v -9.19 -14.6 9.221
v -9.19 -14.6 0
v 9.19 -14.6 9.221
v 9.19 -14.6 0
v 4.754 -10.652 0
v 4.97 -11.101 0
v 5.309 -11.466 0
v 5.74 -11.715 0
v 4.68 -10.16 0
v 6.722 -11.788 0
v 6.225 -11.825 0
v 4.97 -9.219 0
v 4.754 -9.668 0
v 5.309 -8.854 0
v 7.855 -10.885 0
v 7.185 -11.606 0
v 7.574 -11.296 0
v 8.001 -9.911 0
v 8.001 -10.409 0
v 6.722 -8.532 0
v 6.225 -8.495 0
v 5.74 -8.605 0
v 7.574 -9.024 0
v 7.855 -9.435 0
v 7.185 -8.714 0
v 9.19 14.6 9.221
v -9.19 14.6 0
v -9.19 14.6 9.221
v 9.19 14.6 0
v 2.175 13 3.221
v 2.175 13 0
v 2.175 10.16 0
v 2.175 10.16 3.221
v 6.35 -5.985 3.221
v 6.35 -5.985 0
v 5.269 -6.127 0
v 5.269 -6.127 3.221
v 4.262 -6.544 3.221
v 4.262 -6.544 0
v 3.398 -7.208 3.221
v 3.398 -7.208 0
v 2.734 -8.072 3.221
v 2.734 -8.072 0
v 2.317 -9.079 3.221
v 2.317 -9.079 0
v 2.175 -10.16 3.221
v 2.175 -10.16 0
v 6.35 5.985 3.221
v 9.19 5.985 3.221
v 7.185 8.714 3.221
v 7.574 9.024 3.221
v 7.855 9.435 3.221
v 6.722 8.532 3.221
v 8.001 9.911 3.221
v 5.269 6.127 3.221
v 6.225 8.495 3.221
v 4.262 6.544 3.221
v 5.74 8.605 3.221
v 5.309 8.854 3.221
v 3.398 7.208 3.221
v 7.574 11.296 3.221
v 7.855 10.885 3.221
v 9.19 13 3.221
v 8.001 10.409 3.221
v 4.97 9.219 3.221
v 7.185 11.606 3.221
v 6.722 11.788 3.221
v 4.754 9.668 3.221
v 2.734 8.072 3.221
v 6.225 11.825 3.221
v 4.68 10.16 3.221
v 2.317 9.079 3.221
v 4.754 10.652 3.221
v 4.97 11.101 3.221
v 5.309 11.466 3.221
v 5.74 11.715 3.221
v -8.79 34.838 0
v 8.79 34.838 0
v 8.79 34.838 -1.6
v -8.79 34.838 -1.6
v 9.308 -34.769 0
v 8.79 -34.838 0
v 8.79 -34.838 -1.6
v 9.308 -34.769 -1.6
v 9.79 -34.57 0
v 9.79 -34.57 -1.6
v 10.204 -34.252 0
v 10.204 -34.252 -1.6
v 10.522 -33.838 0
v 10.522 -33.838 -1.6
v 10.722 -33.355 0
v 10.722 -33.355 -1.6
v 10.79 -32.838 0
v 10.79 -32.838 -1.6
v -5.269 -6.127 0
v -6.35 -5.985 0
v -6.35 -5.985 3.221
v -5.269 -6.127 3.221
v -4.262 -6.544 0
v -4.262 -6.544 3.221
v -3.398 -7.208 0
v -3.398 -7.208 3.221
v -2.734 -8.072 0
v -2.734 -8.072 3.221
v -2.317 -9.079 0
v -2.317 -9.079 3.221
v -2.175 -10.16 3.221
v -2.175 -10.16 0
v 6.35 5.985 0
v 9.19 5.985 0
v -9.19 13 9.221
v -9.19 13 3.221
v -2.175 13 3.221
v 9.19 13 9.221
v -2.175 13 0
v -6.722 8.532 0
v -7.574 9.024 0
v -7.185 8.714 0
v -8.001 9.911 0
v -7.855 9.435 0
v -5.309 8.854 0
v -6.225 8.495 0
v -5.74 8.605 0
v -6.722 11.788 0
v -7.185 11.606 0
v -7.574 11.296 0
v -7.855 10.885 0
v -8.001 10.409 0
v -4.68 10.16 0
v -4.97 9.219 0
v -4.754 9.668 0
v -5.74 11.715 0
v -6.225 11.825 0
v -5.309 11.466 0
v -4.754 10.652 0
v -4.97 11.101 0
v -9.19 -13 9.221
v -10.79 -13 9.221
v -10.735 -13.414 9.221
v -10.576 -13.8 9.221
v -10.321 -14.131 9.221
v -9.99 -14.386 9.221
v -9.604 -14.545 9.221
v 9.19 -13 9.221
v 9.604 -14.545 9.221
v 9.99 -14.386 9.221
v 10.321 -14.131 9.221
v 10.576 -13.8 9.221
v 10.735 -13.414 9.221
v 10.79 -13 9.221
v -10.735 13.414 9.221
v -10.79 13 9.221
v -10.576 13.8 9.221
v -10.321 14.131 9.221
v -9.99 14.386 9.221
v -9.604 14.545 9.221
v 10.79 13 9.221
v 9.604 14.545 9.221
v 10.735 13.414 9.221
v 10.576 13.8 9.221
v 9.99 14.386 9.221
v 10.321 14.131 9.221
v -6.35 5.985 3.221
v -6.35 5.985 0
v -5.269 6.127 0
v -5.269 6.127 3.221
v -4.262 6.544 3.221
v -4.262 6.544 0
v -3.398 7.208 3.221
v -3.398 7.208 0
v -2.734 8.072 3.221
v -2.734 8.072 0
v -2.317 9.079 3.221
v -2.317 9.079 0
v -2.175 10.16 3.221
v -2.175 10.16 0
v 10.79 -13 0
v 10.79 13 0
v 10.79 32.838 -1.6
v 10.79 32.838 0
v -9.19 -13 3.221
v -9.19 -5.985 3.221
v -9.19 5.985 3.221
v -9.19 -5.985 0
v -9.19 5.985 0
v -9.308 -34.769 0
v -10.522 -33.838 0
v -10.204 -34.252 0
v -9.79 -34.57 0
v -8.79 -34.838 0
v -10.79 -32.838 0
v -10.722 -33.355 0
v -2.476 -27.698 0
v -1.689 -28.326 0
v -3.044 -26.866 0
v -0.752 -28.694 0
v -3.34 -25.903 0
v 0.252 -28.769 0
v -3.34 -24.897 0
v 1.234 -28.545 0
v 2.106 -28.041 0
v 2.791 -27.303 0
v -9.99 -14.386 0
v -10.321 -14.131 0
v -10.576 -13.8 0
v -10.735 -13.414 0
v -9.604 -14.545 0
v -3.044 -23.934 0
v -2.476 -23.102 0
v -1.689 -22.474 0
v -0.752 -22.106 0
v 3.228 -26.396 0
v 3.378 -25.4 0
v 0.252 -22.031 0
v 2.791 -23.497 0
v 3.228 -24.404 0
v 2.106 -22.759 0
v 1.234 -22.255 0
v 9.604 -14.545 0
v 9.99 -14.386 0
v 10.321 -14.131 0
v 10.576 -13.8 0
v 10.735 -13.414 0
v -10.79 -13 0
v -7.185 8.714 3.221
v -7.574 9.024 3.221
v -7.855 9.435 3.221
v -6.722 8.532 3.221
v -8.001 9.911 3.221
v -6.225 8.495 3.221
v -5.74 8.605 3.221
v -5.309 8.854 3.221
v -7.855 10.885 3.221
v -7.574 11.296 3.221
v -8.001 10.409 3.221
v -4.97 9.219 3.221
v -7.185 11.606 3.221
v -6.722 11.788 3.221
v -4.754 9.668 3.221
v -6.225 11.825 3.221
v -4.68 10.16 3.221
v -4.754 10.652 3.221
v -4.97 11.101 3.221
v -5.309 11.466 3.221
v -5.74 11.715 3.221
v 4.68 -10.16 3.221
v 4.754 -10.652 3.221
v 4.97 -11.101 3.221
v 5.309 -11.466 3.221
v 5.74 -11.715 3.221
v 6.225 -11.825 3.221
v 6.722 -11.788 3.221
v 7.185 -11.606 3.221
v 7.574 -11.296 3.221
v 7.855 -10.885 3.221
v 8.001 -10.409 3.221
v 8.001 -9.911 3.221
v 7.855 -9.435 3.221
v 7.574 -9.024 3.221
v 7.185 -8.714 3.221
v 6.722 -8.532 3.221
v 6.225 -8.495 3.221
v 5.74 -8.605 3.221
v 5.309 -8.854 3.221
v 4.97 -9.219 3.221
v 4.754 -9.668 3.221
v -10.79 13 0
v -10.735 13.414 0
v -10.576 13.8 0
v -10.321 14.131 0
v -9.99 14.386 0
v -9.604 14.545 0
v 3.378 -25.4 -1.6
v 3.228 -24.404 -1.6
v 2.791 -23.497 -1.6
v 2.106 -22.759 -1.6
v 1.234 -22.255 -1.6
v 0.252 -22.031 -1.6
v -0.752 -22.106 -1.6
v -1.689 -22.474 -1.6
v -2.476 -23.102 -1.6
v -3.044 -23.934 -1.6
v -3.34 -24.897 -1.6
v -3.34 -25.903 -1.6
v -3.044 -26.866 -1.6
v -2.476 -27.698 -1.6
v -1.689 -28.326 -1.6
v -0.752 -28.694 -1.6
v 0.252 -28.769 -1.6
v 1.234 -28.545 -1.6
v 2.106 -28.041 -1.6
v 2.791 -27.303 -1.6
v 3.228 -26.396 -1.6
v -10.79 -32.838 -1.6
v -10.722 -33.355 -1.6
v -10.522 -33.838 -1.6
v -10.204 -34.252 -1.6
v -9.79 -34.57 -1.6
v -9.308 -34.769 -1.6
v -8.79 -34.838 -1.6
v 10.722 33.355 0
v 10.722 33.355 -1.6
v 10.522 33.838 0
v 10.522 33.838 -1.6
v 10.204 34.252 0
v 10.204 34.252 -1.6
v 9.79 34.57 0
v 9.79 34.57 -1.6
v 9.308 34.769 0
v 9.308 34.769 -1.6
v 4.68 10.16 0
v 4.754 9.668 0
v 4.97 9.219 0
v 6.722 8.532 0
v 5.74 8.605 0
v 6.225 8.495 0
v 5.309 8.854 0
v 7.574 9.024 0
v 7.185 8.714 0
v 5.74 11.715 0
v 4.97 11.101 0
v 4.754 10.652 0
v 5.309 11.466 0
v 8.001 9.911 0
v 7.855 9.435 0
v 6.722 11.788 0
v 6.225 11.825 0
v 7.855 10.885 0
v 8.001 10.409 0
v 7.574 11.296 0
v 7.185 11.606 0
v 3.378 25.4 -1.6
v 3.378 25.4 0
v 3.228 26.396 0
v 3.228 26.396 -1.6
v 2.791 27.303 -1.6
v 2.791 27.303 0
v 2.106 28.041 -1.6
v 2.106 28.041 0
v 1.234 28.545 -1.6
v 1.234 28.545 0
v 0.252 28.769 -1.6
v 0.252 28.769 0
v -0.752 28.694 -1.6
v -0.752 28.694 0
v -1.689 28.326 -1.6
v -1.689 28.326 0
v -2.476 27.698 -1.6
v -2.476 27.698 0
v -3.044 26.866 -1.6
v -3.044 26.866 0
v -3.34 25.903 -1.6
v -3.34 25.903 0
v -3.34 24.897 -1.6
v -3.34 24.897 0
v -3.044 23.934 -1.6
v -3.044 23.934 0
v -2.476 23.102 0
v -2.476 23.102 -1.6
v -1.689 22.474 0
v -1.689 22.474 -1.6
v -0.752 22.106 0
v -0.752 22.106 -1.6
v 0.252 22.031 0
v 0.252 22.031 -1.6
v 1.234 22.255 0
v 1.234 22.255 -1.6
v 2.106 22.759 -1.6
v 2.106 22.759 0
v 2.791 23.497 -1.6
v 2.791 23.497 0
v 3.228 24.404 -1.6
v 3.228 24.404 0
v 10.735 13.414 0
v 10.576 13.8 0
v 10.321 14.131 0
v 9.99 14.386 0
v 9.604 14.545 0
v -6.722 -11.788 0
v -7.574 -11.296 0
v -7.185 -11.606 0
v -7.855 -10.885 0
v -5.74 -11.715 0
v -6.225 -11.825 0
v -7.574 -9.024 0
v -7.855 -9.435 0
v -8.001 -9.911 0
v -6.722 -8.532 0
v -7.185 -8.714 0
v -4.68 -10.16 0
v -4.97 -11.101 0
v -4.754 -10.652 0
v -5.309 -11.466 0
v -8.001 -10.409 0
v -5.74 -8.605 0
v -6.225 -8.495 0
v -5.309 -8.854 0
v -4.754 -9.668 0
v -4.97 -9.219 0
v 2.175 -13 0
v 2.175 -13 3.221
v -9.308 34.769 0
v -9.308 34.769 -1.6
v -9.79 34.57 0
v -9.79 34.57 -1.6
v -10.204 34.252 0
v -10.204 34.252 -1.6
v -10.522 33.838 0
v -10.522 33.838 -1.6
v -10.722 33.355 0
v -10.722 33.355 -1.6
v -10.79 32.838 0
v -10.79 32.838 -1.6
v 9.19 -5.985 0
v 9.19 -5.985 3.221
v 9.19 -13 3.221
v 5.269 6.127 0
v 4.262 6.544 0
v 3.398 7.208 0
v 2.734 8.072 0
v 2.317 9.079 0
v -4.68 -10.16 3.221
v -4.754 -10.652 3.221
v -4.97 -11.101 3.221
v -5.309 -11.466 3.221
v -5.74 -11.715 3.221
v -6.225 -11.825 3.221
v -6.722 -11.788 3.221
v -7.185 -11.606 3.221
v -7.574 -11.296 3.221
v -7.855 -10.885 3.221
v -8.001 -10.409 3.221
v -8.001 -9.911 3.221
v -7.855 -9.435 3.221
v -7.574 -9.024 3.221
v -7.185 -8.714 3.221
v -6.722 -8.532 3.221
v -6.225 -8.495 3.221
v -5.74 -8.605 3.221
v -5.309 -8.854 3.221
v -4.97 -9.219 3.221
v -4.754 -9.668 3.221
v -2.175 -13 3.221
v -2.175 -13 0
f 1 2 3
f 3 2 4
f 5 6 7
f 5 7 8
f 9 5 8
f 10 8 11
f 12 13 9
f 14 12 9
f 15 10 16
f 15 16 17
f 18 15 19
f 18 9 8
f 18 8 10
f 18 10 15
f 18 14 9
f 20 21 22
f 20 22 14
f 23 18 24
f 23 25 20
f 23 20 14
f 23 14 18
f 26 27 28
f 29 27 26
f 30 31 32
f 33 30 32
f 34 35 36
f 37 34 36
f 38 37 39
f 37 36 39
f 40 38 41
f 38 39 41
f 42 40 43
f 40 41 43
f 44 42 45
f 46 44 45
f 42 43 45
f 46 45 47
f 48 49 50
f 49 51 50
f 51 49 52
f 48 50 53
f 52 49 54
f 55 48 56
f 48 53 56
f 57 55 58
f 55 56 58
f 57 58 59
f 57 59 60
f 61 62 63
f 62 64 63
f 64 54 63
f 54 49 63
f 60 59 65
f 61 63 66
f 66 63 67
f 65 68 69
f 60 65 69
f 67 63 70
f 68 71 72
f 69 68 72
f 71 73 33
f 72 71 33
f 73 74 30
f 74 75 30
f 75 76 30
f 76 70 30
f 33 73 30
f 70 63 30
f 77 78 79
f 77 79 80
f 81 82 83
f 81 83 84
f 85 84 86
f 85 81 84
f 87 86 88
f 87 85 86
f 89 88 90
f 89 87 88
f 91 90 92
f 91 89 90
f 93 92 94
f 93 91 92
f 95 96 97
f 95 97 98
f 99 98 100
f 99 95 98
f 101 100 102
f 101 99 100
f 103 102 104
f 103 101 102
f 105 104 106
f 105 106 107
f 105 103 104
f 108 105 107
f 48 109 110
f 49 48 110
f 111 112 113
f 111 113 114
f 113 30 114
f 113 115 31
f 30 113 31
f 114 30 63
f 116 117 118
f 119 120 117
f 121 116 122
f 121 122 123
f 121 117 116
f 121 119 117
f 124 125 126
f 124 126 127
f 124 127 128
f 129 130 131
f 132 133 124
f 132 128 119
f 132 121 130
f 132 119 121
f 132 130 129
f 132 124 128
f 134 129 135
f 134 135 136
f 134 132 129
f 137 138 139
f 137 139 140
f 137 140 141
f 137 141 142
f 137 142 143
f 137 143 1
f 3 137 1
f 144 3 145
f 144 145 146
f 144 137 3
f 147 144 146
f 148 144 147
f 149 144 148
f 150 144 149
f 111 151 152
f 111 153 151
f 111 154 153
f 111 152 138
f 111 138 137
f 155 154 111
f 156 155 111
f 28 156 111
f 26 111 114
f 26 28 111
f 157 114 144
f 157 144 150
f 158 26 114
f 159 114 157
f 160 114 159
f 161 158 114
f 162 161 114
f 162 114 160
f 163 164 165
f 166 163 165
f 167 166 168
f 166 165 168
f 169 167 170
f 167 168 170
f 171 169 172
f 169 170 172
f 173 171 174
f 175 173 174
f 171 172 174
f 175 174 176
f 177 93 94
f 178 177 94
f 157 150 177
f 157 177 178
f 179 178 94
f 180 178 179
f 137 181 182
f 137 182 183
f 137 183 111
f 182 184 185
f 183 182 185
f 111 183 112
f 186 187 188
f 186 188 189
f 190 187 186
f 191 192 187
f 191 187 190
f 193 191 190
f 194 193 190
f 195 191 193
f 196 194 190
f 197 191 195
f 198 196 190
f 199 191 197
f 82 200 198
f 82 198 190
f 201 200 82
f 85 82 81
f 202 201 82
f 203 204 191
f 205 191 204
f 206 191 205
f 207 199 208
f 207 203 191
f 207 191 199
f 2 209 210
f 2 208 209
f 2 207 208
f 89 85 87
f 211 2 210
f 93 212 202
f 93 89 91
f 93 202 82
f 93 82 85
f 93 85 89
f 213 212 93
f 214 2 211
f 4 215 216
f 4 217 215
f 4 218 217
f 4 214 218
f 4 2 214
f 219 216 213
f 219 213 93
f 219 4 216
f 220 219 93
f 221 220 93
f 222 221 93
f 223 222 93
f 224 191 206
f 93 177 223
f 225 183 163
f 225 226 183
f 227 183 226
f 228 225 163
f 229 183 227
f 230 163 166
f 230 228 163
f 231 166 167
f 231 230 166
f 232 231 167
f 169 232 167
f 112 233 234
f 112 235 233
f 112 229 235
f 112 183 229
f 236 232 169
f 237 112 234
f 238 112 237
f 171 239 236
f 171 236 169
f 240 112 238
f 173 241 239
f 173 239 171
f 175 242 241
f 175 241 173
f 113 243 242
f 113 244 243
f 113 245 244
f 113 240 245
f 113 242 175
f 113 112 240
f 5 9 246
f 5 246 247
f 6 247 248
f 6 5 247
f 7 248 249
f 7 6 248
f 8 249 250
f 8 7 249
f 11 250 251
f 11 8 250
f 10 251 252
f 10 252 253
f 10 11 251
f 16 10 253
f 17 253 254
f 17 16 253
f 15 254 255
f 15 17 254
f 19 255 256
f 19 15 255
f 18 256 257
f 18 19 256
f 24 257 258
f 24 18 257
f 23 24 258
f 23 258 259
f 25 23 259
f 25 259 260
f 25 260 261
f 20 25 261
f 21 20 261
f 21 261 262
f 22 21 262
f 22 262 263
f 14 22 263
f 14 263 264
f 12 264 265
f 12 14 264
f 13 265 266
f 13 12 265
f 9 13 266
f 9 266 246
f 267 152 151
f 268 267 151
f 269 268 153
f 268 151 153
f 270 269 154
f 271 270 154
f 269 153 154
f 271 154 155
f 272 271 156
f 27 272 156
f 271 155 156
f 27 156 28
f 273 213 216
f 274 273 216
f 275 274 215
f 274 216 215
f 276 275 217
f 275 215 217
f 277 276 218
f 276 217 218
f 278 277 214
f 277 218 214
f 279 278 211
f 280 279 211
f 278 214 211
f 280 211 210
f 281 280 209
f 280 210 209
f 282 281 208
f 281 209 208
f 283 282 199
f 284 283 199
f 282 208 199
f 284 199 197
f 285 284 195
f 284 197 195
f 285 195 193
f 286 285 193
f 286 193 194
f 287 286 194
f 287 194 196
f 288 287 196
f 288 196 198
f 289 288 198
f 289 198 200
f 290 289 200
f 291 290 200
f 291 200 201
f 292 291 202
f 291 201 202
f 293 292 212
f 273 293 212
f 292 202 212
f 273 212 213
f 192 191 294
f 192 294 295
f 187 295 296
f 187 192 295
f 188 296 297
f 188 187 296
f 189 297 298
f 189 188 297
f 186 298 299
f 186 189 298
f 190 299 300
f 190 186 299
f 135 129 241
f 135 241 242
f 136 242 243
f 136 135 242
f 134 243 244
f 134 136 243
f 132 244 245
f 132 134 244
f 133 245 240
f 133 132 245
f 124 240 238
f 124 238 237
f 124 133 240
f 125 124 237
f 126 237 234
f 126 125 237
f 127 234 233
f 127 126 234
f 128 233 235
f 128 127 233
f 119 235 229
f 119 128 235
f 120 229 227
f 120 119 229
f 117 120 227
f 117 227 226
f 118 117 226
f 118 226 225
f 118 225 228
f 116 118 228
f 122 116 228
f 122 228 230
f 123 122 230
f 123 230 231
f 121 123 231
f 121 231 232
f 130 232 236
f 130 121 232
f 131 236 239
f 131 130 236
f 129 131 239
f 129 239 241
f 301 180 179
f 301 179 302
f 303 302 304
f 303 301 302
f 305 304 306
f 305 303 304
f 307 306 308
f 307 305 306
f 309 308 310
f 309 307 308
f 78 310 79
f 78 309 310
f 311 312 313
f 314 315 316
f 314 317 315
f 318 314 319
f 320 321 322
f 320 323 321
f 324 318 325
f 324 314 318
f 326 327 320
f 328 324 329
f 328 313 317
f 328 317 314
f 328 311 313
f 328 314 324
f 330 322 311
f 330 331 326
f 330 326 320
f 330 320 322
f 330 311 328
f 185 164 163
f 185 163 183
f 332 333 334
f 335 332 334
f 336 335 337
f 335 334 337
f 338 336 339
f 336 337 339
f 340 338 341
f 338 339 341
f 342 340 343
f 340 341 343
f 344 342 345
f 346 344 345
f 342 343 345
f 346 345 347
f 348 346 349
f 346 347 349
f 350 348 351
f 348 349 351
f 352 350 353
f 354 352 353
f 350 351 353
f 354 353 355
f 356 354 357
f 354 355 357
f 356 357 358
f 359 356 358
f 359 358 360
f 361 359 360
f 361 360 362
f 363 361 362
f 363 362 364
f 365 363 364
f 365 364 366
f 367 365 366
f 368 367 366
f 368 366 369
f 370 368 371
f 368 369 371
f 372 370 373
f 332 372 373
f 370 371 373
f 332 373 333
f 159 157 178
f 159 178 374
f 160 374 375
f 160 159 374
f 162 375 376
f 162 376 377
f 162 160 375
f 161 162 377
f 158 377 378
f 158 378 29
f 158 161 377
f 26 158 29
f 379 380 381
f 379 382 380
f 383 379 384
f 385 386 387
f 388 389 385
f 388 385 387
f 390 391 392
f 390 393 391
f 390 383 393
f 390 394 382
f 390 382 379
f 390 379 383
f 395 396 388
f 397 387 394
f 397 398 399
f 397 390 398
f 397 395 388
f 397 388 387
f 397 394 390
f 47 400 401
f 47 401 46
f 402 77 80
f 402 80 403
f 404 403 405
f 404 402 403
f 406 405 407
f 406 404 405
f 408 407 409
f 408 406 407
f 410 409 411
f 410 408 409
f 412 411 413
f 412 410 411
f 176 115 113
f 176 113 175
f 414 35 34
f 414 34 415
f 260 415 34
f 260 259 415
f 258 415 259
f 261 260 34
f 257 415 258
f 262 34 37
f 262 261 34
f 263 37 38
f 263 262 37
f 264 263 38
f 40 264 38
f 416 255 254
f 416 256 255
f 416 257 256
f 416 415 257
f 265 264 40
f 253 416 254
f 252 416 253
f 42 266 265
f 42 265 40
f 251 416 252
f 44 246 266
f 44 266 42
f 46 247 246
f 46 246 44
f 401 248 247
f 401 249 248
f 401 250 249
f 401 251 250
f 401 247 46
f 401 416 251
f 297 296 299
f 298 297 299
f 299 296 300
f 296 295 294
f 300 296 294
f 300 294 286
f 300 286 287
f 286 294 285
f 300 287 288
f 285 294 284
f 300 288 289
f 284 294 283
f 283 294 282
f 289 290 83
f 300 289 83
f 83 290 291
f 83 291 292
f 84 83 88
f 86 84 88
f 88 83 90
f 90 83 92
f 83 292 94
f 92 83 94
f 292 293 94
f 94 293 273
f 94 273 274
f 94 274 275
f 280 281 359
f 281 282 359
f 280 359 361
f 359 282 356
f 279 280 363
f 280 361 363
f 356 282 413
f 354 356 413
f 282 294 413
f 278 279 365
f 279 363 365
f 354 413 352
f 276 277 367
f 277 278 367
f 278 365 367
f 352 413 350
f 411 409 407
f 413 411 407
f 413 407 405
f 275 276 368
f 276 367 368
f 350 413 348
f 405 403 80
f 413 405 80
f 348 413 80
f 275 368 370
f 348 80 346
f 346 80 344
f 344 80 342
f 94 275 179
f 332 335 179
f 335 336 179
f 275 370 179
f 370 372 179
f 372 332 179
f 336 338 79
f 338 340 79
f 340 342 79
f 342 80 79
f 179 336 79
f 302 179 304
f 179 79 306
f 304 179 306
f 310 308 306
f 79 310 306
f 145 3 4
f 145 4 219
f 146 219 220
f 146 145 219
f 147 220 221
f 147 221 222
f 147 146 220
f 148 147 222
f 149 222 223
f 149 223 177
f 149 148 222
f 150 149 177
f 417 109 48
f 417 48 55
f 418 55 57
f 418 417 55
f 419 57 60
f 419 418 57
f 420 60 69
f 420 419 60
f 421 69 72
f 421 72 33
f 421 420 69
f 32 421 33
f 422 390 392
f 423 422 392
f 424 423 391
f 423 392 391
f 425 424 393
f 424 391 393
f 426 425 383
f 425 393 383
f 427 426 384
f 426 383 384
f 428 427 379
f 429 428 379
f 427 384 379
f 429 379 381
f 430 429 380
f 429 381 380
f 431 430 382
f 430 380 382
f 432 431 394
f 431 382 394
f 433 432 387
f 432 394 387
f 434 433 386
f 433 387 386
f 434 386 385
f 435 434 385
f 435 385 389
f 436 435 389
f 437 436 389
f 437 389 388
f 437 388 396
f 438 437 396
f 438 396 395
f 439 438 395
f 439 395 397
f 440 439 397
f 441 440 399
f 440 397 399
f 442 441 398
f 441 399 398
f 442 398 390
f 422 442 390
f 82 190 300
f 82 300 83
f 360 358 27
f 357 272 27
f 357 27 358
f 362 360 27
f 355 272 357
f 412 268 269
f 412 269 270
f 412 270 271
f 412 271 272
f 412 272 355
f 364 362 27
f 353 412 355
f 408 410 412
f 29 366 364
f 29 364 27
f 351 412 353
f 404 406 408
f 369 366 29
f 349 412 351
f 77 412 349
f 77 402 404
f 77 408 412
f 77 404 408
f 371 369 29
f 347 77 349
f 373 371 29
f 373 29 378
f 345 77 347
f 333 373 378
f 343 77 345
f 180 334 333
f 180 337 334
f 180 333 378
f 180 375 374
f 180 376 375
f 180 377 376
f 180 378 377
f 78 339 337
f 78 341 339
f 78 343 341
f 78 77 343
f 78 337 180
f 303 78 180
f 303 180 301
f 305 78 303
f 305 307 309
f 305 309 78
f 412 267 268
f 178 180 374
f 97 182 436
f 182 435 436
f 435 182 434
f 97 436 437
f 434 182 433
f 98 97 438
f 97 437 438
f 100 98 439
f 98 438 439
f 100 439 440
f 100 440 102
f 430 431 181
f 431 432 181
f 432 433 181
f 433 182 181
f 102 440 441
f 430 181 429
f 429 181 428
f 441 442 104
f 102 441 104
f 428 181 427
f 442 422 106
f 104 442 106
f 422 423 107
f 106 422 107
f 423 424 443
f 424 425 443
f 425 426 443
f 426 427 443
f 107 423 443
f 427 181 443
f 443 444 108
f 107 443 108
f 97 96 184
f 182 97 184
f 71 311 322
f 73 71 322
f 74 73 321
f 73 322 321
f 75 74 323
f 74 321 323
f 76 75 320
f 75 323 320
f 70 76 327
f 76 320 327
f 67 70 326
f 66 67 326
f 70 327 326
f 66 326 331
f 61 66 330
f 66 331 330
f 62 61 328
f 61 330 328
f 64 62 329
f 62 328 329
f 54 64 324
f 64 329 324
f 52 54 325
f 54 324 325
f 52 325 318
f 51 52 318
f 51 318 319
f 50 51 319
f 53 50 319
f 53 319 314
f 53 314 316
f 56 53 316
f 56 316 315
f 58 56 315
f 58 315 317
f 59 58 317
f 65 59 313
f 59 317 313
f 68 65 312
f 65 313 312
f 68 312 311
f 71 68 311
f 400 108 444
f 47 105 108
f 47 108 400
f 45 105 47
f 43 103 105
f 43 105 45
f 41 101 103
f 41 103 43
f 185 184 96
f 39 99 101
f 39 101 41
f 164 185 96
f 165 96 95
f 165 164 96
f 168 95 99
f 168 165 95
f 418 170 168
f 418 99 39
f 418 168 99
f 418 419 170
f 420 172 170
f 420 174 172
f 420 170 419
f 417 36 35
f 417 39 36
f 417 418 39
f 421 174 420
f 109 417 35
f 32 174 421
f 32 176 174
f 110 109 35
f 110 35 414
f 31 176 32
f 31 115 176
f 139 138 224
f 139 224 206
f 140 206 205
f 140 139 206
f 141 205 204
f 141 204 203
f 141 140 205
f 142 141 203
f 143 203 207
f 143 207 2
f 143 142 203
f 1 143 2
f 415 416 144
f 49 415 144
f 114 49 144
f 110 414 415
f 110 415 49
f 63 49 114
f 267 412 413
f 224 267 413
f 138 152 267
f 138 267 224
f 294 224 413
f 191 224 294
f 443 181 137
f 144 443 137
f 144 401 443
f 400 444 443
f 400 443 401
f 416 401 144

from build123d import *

# Parameters (mm, degrees)
SKETCH_W                = 18.38
SKETCH_H                = 26
PAD_DEPTH               = 9.221
THICKNESS_T             = 1.6
SKETCH001_R             = 1.67005
PAD001_DEPTH            = 3.221
SKETCH001_MIRRORED_2_R  = 1.67005
PAD001_MIRRORED_2_DEPTH = 3.221
SKETCH002_R             = 3.3782
PAD002_DEPTH            = 1.6


with BuildPart() as part:
    # Sketch → Pad (new body)
    with BuildSketch(Plane.XY):
        Rectangle(SKETCH_W, SKETCH_H)
    extrude(amount=PAD_DEPTH)

    # Thickness
    thickness_openings = [part.faces().sort_by_distance(p)[0] for p in [
        (0, 0, 9.221),
    ]]
    offset(amount=THICKNESS_T, openings=thickness_openings)

    # Sketch001 → Pad001 (join)
    with BuildSketch(Plane.XY):
        with BuildLine():
            ThreePointArc((-6.35, 5.984875), (-3.397741, 7.207741), (-2.174875, 10.16))
            Line((-2.174875, 13), (-2.174875, 10.16))
            Line((-9.19, 13), (-2.174875, 13))
            Line((-9.19, 5.984875), (-9.19, 13))
            Line((-6.35, 5.984875), (-9.19, 5.984875))
        make_face()
        with Locations((-6.35, 10.16)):
            Circle(SKETCH001_R, mode=Mode.SUBTRACT)
    pad001 = extrude(amount=PAD001_DEPTH)

    # Sketch001 Mirrored 2 → Pad001 Mirrored 2 (add)
    with BuildSketch(Plane(origin=(0, 0, 0), x_dir=(-1, 0, 0), z_dir=(0, 0, -1))):
        with BuildLine():
            ThreePointArc((-6.35, 5.984875), (-3.397741, 7.207741), (-2.174875, 10.16))
            Line((-2.174875, 13), (-2.174875, 10.16))
            Line((-9.19, 13), (-2.174875, 13))
            Line((-9.19, 5.984875), (-9.19, 13))
            Line((-6.35, 5.984875), (-9.19, 5.984875))
        make_face()
        with Locations((-6.35, 10.16)):
            Circle(SKETCH001_MIRRORED_2_R, mode=Mode.SUBTRACT)
    pad001_mirrored_2 = extrude(amount=-PAD001_MIRRORED_2_DEPTH)

    # Mirrored001: Pad001, Pad001 Mirrored 2 across XZ
    add(pad001.mirror(Plane.XZ))
    add(pad001_mirrored_2.mirror(Plane.XZ))

    # Sketch002 → Pad002 (join)
    with BuildSketch(Plane.XY):
        with BuildLine():
            Line((-10.79, 32.8375), (-10.79, -32.8375))
            ThreePointArc((-10.79, -32.8375), (-10.204214, -34.251714), (-8.79, -34.8375))
            Line((-8.79, -34.8375), (8.79, -34.8375))
            ThreePointArc((8.79, -34.8375), (10.204214, -34.251714), (10.79, -32.8375))
            Line((10.79, -32.8375), (10.79, 32.8375))
            ThreePointArc((10.79, 32.8375), (10.204214, 34.251714), (8.79, 34.8375))
            Line((8.79, 34.8375), (-8.79, 34.8375))
            ThreePointArc((-8.79, 34.8375), (-10.204214, 34.251714), (-10.79, 32.8375))
        make_face()
        with Locations((0, 25.4)):
            Circle(SKETCH002_R, mode=Mode.SUBTRACT)
        with Locations((0, -25.4)):
            Circle(SKETCH002_R, mode=Mode.SUBTRACT)
    extrude(amount=-PAD002_DEPTH)


solid = part.part
